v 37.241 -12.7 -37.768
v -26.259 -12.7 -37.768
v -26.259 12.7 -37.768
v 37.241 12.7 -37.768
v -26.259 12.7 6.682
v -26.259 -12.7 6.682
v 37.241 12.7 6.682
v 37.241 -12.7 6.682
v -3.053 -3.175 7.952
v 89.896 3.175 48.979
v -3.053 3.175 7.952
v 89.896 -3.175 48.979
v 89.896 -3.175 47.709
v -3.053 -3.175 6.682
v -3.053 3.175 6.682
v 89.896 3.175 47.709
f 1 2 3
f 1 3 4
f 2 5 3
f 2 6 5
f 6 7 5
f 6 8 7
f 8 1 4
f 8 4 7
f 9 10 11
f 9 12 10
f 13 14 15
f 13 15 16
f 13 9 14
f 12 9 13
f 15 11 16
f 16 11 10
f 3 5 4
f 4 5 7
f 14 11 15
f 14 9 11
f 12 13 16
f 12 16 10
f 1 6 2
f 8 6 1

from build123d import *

# Parameters (mm, degrees)
F1_DEPTH = 12.7
F2_DEPTH = 3.175


with BuildPart() as f1:
    # F0 (on Front) → F1 (new body, symmetric)
    with BuildSketch(Plane.XZ):
        Polygon((-3.052571, 6.682177), (-26.259099, 6.682177), (-26.259099, -37.767823), (37.240901, -37.767823), (37.240901, 6.682177), align=None)
    extrude(amount=F1_DEPTH, both=True)


with BuildPart() as f2:
    # F0 (on Front) → F2 (new body, symmetric)
    with BuildSketch(Plane.XZ):
        Polygon((-3.052571, 7.952177), (-3.052571, 6.682177), (89.895522, 47.709143), (89.895522, 48.979143), align=None)
    extrude(amount=F2_DEPTH, both=True)


solid = Compound([f1.part, f2.part])
